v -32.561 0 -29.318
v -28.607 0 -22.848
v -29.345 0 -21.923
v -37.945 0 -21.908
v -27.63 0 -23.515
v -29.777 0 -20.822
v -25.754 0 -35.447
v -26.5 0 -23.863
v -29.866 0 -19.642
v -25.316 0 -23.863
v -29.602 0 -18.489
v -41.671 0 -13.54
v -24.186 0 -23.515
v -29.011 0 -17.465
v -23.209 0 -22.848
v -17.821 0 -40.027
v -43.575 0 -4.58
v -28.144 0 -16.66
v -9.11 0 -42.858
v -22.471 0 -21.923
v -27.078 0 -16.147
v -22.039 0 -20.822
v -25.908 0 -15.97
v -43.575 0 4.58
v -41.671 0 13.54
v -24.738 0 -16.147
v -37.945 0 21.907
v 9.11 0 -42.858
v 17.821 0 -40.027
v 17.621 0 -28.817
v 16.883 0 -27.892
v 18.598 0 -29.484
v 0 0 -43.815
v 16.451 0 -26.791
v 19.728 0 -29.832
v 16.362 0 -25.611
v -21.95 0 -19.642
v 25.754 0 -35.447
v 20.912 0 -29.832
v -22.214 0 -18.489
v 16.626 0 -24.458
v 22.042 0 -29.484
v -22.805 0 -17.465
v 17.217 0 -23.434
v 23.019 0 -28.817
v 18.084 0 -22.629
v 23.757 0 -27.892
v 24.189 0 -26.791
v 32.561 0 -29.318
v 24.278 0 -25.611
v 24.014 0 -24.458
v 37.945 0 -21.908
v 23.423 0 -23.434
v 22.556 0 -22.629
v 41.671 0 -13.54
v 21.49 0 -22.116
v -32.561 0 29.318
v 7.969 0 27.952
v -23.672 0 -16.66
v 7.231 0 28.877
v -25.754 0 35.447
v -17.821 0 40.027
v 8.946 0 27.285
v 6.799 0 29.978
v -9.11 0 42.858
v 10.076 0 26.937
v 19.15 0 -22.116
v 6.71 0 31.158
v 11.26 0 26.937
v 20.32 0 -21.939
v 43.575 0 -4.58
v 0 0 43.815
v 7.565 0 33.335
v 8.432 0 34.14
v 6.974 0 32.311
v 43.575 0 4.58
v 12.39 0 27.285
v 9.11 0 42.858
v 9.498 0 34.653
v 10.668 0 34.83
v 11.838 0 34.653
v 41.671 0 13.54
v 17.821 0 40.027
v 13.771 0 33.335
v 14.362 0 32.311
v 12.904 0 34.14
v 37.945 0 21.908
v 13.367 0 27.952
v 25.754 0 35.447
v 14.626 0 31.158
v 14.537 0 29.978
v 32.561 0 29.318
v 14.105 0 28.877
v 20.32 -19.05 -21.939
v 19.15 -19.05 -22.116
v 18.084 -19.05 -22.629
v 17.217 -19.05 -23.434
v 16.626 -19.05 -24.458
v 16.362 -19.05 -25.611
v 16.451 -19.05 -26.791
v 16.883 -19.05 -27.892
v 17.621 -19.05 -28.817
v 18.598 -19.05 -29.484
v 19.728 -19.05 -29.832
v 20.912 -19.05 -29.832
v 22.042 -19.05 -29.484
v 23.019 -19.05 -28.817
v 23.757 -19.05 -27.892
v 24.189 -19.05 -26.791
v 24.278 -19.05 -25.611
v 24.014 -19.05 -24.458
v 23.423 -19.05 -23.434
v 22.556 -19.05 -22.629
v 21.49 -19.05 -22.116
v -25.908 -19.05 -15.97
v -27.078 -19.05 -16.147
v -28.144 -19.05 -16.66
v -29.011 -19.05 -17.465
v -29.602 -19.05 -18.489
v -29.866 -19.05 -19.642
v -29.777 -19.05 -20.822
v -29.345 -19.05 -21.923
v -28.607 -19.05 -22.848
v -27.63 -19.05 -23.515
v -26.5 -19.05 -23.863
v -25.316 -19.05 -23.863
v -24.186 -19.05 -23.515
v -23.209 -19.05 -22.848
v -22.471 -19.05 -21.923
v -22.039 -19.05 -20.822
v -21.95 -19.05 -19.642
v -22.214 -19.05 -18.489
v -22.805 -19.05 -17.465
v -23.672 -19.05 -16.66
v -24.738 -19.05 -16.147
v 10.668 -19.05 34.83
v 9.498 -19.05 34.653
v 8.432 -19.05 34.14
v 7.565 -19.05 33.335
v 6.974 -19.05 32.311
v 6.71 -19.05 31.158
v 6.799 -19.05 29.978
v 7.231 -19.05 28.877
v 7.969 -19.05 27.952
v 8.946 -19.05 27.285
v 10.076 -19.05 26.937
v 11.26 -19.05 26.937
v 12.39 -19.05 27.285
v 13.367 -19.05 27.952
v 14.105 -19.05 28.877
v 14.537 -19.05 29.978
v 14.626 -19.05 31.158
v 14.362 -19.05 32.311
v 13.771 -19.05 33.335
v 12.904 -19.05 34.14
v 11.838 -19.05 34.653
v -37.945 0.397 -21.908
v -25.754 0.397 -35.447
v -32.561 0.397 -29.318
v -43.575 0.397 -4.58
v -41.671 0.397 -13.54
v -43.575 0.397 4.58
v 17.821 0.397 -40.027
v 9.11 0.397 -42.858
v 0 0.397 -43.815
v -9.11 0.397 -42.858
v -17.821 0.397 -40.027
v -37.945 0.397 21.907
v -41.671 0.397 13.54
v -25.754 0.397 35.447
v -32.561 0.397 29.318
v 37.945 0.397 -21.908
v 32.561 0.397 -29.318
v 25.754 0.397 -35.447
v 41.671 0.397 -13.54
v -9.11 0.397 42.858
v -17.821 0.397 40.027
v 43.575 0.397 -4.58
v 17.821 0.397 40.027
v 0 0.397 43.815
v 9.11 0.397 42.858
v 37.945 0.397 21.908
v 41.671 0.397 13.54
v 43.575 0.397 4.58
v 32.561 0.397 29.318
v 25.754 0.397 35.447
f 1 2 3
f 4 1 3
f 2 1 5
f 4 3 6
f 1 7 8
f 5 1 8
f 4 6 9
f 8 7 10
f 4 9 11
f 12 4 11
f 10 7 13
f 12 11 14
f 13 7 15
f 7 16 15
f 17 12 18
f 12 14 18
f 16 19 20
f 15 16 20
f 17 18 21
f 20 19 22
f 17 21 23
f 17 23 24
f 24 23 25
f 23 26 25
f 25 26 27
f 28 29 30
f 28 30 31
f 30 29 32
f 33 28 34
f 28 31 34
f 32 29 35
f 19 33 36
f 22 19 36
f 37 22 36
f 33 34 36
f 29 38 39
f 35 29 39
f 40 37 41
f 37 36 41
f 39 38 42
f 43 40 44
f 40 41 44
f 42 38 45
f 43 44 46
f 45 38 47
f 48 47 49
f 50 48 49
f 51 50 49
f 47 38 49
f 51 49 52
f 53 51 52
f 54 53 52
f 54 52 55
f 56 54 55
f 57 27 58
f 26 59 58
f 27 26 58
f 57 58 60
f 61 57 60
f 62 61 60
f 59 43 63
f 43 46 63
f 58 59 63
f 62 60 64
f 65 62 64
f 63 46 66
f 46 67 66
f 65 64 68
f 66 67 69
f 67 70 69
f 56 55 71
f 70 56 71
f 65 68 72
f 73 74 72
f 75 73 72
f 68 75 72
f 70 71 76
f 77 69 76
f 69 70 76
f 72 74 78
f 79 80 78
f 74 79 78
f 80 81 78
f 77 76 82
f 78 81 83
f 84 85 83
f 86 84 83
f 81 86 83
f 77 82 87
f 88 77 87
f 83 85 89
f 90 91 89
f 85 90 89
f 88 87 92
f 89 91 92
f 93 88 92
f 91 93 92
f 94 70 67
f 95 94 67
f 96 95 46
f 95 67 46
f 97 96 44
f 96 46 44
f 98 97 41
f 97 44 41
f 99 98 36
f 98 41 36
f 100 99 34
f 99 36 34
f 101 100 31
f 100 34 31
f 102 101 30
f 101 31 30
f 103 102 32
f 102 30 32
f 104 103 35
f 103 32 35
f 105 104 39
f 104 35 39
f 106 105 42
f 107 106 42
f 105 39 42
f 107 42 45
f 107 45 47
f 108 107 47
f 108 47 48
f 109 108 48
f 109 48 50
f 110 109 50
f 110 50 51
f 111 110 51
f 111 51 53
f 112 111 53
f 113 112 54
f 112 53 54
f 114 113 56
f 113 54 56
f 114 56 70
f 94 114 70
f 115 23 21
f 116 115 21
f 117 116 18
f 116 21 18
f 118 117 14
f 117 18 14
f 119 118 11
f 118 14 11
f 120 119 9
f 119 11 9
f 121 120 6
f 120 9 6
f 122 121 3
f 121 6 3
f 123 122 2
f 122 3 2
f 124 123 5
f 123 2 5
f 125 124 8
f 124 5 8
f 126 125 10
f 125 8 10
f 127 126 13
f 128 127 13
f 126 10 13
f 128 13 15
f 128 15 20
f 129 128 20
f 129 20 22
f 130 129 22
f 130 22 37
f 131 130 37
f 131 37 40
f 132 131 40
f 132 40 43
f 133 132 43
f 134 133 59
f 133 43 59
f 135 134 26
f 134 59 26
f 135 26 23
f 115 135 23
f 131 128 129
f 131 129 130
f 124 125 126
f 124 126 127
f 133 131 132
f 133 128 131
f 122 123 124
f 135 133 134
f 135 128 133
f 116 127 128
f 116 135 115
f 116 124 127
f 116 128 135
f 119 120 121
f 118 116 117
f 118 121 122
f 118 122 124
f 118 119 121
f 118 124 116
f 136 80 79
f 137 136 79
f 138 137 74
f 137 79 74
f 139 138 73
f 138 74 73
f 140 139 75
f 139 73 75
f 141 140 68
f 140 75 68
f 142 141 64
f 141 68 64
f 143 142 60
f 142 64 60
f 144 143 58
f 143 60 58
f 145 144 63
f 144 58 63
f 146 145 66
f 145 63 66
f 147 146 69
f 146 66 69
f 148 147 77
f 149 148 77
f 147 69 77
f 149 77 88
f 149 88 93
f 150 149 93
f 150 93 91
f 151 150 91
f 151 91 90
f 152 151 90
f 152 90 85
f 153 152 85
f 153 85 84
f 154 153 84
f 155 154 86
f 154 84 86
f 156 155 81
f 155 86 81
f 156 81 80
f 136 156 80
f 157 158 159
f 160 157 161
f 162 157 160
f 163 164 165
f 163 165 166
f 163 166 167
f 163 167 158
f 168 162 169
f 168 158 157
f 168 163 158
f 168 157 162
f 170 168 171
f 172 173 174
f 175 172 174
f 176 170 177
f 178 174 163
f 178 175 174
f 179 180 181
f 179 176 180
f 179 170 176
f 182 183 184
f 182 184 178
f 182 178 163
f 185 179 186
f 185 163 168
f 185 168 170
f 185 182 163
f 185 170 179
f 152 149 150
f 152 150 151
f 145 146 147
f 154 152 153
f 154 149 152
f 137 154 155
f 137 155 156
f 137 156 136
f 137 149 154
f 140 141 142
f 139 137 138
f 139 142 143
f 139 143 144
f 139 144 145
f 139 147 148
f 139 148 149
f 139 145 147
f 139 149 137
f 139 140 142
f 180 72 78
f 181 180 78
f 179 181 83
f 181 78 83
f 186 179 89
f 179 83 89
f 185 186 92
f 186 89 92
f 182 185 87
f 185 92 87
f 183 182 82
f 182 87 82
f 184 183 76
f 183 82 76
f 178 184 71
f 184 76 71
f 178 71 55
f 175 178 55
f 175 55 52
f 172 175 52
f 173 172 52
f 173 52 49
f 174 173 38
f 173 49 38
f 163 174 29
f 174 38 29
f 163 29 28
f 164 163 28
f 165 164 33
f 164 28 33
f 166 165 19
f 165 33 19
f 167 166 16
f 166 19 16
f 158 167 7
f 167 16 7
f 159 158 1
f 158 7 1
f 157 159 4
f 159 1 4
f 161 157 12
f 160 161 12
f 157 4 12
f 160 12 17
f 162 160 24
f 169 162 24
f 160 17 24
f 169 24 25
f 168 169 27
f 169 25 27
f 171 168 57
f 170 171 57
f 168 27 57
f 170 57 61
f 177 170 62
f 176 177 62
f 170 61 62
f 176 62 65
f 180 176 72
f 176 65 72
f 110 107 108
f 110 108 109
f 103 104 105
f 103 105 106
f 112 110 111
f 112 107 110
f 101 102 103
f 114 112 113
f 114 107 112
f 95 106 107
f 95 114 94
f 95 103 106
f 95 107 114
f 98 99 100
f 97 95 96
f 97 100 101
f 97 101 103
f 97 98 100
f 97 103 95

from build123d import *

# Parameters (mm, degrees)
SKETCH1_R           = 43.815
BOSS_EXTRUDE1_DEPTH = 0.396875
SKETCH2_R           = 3.96875
BOSS_EXTRUDE2_DEPTH = 19.05


with BuildPart() as part:
    # Sketch1 → Boss-Extrude1 (new body)
    with BuildSketch(Plane(origin=(0, 0, 0), x_dir=(1, 0, 0), z_dir=(0, 1, 0))):
        with Locations(Location((0, 0, 0), (0, 0, 270))):
            Circle(SKETCH1_R)
    extrude(amount=BOSS_EXTRUDE1_DEPTH)

    # Sketch2 → Boss-Extrude2 (add)
    with BuildSketch(Plane.XZ):
        with Locations(Location((20.32, -25.908, 0), (0, 0, 90))):
            Circle(SKETCH2_R)
        with Locations(Location((-25.908, -19.939, 0), (0, 0, 90))):
            Circle(SKETCH2_R)
        with Locations(Location((10.668, 30.861, 0), (0, 0, 90))):
            Circle(SKETCH2_R)
    extrude(amount=BOSS_EXTRUDE2_DEPTH)


solid = part.part
